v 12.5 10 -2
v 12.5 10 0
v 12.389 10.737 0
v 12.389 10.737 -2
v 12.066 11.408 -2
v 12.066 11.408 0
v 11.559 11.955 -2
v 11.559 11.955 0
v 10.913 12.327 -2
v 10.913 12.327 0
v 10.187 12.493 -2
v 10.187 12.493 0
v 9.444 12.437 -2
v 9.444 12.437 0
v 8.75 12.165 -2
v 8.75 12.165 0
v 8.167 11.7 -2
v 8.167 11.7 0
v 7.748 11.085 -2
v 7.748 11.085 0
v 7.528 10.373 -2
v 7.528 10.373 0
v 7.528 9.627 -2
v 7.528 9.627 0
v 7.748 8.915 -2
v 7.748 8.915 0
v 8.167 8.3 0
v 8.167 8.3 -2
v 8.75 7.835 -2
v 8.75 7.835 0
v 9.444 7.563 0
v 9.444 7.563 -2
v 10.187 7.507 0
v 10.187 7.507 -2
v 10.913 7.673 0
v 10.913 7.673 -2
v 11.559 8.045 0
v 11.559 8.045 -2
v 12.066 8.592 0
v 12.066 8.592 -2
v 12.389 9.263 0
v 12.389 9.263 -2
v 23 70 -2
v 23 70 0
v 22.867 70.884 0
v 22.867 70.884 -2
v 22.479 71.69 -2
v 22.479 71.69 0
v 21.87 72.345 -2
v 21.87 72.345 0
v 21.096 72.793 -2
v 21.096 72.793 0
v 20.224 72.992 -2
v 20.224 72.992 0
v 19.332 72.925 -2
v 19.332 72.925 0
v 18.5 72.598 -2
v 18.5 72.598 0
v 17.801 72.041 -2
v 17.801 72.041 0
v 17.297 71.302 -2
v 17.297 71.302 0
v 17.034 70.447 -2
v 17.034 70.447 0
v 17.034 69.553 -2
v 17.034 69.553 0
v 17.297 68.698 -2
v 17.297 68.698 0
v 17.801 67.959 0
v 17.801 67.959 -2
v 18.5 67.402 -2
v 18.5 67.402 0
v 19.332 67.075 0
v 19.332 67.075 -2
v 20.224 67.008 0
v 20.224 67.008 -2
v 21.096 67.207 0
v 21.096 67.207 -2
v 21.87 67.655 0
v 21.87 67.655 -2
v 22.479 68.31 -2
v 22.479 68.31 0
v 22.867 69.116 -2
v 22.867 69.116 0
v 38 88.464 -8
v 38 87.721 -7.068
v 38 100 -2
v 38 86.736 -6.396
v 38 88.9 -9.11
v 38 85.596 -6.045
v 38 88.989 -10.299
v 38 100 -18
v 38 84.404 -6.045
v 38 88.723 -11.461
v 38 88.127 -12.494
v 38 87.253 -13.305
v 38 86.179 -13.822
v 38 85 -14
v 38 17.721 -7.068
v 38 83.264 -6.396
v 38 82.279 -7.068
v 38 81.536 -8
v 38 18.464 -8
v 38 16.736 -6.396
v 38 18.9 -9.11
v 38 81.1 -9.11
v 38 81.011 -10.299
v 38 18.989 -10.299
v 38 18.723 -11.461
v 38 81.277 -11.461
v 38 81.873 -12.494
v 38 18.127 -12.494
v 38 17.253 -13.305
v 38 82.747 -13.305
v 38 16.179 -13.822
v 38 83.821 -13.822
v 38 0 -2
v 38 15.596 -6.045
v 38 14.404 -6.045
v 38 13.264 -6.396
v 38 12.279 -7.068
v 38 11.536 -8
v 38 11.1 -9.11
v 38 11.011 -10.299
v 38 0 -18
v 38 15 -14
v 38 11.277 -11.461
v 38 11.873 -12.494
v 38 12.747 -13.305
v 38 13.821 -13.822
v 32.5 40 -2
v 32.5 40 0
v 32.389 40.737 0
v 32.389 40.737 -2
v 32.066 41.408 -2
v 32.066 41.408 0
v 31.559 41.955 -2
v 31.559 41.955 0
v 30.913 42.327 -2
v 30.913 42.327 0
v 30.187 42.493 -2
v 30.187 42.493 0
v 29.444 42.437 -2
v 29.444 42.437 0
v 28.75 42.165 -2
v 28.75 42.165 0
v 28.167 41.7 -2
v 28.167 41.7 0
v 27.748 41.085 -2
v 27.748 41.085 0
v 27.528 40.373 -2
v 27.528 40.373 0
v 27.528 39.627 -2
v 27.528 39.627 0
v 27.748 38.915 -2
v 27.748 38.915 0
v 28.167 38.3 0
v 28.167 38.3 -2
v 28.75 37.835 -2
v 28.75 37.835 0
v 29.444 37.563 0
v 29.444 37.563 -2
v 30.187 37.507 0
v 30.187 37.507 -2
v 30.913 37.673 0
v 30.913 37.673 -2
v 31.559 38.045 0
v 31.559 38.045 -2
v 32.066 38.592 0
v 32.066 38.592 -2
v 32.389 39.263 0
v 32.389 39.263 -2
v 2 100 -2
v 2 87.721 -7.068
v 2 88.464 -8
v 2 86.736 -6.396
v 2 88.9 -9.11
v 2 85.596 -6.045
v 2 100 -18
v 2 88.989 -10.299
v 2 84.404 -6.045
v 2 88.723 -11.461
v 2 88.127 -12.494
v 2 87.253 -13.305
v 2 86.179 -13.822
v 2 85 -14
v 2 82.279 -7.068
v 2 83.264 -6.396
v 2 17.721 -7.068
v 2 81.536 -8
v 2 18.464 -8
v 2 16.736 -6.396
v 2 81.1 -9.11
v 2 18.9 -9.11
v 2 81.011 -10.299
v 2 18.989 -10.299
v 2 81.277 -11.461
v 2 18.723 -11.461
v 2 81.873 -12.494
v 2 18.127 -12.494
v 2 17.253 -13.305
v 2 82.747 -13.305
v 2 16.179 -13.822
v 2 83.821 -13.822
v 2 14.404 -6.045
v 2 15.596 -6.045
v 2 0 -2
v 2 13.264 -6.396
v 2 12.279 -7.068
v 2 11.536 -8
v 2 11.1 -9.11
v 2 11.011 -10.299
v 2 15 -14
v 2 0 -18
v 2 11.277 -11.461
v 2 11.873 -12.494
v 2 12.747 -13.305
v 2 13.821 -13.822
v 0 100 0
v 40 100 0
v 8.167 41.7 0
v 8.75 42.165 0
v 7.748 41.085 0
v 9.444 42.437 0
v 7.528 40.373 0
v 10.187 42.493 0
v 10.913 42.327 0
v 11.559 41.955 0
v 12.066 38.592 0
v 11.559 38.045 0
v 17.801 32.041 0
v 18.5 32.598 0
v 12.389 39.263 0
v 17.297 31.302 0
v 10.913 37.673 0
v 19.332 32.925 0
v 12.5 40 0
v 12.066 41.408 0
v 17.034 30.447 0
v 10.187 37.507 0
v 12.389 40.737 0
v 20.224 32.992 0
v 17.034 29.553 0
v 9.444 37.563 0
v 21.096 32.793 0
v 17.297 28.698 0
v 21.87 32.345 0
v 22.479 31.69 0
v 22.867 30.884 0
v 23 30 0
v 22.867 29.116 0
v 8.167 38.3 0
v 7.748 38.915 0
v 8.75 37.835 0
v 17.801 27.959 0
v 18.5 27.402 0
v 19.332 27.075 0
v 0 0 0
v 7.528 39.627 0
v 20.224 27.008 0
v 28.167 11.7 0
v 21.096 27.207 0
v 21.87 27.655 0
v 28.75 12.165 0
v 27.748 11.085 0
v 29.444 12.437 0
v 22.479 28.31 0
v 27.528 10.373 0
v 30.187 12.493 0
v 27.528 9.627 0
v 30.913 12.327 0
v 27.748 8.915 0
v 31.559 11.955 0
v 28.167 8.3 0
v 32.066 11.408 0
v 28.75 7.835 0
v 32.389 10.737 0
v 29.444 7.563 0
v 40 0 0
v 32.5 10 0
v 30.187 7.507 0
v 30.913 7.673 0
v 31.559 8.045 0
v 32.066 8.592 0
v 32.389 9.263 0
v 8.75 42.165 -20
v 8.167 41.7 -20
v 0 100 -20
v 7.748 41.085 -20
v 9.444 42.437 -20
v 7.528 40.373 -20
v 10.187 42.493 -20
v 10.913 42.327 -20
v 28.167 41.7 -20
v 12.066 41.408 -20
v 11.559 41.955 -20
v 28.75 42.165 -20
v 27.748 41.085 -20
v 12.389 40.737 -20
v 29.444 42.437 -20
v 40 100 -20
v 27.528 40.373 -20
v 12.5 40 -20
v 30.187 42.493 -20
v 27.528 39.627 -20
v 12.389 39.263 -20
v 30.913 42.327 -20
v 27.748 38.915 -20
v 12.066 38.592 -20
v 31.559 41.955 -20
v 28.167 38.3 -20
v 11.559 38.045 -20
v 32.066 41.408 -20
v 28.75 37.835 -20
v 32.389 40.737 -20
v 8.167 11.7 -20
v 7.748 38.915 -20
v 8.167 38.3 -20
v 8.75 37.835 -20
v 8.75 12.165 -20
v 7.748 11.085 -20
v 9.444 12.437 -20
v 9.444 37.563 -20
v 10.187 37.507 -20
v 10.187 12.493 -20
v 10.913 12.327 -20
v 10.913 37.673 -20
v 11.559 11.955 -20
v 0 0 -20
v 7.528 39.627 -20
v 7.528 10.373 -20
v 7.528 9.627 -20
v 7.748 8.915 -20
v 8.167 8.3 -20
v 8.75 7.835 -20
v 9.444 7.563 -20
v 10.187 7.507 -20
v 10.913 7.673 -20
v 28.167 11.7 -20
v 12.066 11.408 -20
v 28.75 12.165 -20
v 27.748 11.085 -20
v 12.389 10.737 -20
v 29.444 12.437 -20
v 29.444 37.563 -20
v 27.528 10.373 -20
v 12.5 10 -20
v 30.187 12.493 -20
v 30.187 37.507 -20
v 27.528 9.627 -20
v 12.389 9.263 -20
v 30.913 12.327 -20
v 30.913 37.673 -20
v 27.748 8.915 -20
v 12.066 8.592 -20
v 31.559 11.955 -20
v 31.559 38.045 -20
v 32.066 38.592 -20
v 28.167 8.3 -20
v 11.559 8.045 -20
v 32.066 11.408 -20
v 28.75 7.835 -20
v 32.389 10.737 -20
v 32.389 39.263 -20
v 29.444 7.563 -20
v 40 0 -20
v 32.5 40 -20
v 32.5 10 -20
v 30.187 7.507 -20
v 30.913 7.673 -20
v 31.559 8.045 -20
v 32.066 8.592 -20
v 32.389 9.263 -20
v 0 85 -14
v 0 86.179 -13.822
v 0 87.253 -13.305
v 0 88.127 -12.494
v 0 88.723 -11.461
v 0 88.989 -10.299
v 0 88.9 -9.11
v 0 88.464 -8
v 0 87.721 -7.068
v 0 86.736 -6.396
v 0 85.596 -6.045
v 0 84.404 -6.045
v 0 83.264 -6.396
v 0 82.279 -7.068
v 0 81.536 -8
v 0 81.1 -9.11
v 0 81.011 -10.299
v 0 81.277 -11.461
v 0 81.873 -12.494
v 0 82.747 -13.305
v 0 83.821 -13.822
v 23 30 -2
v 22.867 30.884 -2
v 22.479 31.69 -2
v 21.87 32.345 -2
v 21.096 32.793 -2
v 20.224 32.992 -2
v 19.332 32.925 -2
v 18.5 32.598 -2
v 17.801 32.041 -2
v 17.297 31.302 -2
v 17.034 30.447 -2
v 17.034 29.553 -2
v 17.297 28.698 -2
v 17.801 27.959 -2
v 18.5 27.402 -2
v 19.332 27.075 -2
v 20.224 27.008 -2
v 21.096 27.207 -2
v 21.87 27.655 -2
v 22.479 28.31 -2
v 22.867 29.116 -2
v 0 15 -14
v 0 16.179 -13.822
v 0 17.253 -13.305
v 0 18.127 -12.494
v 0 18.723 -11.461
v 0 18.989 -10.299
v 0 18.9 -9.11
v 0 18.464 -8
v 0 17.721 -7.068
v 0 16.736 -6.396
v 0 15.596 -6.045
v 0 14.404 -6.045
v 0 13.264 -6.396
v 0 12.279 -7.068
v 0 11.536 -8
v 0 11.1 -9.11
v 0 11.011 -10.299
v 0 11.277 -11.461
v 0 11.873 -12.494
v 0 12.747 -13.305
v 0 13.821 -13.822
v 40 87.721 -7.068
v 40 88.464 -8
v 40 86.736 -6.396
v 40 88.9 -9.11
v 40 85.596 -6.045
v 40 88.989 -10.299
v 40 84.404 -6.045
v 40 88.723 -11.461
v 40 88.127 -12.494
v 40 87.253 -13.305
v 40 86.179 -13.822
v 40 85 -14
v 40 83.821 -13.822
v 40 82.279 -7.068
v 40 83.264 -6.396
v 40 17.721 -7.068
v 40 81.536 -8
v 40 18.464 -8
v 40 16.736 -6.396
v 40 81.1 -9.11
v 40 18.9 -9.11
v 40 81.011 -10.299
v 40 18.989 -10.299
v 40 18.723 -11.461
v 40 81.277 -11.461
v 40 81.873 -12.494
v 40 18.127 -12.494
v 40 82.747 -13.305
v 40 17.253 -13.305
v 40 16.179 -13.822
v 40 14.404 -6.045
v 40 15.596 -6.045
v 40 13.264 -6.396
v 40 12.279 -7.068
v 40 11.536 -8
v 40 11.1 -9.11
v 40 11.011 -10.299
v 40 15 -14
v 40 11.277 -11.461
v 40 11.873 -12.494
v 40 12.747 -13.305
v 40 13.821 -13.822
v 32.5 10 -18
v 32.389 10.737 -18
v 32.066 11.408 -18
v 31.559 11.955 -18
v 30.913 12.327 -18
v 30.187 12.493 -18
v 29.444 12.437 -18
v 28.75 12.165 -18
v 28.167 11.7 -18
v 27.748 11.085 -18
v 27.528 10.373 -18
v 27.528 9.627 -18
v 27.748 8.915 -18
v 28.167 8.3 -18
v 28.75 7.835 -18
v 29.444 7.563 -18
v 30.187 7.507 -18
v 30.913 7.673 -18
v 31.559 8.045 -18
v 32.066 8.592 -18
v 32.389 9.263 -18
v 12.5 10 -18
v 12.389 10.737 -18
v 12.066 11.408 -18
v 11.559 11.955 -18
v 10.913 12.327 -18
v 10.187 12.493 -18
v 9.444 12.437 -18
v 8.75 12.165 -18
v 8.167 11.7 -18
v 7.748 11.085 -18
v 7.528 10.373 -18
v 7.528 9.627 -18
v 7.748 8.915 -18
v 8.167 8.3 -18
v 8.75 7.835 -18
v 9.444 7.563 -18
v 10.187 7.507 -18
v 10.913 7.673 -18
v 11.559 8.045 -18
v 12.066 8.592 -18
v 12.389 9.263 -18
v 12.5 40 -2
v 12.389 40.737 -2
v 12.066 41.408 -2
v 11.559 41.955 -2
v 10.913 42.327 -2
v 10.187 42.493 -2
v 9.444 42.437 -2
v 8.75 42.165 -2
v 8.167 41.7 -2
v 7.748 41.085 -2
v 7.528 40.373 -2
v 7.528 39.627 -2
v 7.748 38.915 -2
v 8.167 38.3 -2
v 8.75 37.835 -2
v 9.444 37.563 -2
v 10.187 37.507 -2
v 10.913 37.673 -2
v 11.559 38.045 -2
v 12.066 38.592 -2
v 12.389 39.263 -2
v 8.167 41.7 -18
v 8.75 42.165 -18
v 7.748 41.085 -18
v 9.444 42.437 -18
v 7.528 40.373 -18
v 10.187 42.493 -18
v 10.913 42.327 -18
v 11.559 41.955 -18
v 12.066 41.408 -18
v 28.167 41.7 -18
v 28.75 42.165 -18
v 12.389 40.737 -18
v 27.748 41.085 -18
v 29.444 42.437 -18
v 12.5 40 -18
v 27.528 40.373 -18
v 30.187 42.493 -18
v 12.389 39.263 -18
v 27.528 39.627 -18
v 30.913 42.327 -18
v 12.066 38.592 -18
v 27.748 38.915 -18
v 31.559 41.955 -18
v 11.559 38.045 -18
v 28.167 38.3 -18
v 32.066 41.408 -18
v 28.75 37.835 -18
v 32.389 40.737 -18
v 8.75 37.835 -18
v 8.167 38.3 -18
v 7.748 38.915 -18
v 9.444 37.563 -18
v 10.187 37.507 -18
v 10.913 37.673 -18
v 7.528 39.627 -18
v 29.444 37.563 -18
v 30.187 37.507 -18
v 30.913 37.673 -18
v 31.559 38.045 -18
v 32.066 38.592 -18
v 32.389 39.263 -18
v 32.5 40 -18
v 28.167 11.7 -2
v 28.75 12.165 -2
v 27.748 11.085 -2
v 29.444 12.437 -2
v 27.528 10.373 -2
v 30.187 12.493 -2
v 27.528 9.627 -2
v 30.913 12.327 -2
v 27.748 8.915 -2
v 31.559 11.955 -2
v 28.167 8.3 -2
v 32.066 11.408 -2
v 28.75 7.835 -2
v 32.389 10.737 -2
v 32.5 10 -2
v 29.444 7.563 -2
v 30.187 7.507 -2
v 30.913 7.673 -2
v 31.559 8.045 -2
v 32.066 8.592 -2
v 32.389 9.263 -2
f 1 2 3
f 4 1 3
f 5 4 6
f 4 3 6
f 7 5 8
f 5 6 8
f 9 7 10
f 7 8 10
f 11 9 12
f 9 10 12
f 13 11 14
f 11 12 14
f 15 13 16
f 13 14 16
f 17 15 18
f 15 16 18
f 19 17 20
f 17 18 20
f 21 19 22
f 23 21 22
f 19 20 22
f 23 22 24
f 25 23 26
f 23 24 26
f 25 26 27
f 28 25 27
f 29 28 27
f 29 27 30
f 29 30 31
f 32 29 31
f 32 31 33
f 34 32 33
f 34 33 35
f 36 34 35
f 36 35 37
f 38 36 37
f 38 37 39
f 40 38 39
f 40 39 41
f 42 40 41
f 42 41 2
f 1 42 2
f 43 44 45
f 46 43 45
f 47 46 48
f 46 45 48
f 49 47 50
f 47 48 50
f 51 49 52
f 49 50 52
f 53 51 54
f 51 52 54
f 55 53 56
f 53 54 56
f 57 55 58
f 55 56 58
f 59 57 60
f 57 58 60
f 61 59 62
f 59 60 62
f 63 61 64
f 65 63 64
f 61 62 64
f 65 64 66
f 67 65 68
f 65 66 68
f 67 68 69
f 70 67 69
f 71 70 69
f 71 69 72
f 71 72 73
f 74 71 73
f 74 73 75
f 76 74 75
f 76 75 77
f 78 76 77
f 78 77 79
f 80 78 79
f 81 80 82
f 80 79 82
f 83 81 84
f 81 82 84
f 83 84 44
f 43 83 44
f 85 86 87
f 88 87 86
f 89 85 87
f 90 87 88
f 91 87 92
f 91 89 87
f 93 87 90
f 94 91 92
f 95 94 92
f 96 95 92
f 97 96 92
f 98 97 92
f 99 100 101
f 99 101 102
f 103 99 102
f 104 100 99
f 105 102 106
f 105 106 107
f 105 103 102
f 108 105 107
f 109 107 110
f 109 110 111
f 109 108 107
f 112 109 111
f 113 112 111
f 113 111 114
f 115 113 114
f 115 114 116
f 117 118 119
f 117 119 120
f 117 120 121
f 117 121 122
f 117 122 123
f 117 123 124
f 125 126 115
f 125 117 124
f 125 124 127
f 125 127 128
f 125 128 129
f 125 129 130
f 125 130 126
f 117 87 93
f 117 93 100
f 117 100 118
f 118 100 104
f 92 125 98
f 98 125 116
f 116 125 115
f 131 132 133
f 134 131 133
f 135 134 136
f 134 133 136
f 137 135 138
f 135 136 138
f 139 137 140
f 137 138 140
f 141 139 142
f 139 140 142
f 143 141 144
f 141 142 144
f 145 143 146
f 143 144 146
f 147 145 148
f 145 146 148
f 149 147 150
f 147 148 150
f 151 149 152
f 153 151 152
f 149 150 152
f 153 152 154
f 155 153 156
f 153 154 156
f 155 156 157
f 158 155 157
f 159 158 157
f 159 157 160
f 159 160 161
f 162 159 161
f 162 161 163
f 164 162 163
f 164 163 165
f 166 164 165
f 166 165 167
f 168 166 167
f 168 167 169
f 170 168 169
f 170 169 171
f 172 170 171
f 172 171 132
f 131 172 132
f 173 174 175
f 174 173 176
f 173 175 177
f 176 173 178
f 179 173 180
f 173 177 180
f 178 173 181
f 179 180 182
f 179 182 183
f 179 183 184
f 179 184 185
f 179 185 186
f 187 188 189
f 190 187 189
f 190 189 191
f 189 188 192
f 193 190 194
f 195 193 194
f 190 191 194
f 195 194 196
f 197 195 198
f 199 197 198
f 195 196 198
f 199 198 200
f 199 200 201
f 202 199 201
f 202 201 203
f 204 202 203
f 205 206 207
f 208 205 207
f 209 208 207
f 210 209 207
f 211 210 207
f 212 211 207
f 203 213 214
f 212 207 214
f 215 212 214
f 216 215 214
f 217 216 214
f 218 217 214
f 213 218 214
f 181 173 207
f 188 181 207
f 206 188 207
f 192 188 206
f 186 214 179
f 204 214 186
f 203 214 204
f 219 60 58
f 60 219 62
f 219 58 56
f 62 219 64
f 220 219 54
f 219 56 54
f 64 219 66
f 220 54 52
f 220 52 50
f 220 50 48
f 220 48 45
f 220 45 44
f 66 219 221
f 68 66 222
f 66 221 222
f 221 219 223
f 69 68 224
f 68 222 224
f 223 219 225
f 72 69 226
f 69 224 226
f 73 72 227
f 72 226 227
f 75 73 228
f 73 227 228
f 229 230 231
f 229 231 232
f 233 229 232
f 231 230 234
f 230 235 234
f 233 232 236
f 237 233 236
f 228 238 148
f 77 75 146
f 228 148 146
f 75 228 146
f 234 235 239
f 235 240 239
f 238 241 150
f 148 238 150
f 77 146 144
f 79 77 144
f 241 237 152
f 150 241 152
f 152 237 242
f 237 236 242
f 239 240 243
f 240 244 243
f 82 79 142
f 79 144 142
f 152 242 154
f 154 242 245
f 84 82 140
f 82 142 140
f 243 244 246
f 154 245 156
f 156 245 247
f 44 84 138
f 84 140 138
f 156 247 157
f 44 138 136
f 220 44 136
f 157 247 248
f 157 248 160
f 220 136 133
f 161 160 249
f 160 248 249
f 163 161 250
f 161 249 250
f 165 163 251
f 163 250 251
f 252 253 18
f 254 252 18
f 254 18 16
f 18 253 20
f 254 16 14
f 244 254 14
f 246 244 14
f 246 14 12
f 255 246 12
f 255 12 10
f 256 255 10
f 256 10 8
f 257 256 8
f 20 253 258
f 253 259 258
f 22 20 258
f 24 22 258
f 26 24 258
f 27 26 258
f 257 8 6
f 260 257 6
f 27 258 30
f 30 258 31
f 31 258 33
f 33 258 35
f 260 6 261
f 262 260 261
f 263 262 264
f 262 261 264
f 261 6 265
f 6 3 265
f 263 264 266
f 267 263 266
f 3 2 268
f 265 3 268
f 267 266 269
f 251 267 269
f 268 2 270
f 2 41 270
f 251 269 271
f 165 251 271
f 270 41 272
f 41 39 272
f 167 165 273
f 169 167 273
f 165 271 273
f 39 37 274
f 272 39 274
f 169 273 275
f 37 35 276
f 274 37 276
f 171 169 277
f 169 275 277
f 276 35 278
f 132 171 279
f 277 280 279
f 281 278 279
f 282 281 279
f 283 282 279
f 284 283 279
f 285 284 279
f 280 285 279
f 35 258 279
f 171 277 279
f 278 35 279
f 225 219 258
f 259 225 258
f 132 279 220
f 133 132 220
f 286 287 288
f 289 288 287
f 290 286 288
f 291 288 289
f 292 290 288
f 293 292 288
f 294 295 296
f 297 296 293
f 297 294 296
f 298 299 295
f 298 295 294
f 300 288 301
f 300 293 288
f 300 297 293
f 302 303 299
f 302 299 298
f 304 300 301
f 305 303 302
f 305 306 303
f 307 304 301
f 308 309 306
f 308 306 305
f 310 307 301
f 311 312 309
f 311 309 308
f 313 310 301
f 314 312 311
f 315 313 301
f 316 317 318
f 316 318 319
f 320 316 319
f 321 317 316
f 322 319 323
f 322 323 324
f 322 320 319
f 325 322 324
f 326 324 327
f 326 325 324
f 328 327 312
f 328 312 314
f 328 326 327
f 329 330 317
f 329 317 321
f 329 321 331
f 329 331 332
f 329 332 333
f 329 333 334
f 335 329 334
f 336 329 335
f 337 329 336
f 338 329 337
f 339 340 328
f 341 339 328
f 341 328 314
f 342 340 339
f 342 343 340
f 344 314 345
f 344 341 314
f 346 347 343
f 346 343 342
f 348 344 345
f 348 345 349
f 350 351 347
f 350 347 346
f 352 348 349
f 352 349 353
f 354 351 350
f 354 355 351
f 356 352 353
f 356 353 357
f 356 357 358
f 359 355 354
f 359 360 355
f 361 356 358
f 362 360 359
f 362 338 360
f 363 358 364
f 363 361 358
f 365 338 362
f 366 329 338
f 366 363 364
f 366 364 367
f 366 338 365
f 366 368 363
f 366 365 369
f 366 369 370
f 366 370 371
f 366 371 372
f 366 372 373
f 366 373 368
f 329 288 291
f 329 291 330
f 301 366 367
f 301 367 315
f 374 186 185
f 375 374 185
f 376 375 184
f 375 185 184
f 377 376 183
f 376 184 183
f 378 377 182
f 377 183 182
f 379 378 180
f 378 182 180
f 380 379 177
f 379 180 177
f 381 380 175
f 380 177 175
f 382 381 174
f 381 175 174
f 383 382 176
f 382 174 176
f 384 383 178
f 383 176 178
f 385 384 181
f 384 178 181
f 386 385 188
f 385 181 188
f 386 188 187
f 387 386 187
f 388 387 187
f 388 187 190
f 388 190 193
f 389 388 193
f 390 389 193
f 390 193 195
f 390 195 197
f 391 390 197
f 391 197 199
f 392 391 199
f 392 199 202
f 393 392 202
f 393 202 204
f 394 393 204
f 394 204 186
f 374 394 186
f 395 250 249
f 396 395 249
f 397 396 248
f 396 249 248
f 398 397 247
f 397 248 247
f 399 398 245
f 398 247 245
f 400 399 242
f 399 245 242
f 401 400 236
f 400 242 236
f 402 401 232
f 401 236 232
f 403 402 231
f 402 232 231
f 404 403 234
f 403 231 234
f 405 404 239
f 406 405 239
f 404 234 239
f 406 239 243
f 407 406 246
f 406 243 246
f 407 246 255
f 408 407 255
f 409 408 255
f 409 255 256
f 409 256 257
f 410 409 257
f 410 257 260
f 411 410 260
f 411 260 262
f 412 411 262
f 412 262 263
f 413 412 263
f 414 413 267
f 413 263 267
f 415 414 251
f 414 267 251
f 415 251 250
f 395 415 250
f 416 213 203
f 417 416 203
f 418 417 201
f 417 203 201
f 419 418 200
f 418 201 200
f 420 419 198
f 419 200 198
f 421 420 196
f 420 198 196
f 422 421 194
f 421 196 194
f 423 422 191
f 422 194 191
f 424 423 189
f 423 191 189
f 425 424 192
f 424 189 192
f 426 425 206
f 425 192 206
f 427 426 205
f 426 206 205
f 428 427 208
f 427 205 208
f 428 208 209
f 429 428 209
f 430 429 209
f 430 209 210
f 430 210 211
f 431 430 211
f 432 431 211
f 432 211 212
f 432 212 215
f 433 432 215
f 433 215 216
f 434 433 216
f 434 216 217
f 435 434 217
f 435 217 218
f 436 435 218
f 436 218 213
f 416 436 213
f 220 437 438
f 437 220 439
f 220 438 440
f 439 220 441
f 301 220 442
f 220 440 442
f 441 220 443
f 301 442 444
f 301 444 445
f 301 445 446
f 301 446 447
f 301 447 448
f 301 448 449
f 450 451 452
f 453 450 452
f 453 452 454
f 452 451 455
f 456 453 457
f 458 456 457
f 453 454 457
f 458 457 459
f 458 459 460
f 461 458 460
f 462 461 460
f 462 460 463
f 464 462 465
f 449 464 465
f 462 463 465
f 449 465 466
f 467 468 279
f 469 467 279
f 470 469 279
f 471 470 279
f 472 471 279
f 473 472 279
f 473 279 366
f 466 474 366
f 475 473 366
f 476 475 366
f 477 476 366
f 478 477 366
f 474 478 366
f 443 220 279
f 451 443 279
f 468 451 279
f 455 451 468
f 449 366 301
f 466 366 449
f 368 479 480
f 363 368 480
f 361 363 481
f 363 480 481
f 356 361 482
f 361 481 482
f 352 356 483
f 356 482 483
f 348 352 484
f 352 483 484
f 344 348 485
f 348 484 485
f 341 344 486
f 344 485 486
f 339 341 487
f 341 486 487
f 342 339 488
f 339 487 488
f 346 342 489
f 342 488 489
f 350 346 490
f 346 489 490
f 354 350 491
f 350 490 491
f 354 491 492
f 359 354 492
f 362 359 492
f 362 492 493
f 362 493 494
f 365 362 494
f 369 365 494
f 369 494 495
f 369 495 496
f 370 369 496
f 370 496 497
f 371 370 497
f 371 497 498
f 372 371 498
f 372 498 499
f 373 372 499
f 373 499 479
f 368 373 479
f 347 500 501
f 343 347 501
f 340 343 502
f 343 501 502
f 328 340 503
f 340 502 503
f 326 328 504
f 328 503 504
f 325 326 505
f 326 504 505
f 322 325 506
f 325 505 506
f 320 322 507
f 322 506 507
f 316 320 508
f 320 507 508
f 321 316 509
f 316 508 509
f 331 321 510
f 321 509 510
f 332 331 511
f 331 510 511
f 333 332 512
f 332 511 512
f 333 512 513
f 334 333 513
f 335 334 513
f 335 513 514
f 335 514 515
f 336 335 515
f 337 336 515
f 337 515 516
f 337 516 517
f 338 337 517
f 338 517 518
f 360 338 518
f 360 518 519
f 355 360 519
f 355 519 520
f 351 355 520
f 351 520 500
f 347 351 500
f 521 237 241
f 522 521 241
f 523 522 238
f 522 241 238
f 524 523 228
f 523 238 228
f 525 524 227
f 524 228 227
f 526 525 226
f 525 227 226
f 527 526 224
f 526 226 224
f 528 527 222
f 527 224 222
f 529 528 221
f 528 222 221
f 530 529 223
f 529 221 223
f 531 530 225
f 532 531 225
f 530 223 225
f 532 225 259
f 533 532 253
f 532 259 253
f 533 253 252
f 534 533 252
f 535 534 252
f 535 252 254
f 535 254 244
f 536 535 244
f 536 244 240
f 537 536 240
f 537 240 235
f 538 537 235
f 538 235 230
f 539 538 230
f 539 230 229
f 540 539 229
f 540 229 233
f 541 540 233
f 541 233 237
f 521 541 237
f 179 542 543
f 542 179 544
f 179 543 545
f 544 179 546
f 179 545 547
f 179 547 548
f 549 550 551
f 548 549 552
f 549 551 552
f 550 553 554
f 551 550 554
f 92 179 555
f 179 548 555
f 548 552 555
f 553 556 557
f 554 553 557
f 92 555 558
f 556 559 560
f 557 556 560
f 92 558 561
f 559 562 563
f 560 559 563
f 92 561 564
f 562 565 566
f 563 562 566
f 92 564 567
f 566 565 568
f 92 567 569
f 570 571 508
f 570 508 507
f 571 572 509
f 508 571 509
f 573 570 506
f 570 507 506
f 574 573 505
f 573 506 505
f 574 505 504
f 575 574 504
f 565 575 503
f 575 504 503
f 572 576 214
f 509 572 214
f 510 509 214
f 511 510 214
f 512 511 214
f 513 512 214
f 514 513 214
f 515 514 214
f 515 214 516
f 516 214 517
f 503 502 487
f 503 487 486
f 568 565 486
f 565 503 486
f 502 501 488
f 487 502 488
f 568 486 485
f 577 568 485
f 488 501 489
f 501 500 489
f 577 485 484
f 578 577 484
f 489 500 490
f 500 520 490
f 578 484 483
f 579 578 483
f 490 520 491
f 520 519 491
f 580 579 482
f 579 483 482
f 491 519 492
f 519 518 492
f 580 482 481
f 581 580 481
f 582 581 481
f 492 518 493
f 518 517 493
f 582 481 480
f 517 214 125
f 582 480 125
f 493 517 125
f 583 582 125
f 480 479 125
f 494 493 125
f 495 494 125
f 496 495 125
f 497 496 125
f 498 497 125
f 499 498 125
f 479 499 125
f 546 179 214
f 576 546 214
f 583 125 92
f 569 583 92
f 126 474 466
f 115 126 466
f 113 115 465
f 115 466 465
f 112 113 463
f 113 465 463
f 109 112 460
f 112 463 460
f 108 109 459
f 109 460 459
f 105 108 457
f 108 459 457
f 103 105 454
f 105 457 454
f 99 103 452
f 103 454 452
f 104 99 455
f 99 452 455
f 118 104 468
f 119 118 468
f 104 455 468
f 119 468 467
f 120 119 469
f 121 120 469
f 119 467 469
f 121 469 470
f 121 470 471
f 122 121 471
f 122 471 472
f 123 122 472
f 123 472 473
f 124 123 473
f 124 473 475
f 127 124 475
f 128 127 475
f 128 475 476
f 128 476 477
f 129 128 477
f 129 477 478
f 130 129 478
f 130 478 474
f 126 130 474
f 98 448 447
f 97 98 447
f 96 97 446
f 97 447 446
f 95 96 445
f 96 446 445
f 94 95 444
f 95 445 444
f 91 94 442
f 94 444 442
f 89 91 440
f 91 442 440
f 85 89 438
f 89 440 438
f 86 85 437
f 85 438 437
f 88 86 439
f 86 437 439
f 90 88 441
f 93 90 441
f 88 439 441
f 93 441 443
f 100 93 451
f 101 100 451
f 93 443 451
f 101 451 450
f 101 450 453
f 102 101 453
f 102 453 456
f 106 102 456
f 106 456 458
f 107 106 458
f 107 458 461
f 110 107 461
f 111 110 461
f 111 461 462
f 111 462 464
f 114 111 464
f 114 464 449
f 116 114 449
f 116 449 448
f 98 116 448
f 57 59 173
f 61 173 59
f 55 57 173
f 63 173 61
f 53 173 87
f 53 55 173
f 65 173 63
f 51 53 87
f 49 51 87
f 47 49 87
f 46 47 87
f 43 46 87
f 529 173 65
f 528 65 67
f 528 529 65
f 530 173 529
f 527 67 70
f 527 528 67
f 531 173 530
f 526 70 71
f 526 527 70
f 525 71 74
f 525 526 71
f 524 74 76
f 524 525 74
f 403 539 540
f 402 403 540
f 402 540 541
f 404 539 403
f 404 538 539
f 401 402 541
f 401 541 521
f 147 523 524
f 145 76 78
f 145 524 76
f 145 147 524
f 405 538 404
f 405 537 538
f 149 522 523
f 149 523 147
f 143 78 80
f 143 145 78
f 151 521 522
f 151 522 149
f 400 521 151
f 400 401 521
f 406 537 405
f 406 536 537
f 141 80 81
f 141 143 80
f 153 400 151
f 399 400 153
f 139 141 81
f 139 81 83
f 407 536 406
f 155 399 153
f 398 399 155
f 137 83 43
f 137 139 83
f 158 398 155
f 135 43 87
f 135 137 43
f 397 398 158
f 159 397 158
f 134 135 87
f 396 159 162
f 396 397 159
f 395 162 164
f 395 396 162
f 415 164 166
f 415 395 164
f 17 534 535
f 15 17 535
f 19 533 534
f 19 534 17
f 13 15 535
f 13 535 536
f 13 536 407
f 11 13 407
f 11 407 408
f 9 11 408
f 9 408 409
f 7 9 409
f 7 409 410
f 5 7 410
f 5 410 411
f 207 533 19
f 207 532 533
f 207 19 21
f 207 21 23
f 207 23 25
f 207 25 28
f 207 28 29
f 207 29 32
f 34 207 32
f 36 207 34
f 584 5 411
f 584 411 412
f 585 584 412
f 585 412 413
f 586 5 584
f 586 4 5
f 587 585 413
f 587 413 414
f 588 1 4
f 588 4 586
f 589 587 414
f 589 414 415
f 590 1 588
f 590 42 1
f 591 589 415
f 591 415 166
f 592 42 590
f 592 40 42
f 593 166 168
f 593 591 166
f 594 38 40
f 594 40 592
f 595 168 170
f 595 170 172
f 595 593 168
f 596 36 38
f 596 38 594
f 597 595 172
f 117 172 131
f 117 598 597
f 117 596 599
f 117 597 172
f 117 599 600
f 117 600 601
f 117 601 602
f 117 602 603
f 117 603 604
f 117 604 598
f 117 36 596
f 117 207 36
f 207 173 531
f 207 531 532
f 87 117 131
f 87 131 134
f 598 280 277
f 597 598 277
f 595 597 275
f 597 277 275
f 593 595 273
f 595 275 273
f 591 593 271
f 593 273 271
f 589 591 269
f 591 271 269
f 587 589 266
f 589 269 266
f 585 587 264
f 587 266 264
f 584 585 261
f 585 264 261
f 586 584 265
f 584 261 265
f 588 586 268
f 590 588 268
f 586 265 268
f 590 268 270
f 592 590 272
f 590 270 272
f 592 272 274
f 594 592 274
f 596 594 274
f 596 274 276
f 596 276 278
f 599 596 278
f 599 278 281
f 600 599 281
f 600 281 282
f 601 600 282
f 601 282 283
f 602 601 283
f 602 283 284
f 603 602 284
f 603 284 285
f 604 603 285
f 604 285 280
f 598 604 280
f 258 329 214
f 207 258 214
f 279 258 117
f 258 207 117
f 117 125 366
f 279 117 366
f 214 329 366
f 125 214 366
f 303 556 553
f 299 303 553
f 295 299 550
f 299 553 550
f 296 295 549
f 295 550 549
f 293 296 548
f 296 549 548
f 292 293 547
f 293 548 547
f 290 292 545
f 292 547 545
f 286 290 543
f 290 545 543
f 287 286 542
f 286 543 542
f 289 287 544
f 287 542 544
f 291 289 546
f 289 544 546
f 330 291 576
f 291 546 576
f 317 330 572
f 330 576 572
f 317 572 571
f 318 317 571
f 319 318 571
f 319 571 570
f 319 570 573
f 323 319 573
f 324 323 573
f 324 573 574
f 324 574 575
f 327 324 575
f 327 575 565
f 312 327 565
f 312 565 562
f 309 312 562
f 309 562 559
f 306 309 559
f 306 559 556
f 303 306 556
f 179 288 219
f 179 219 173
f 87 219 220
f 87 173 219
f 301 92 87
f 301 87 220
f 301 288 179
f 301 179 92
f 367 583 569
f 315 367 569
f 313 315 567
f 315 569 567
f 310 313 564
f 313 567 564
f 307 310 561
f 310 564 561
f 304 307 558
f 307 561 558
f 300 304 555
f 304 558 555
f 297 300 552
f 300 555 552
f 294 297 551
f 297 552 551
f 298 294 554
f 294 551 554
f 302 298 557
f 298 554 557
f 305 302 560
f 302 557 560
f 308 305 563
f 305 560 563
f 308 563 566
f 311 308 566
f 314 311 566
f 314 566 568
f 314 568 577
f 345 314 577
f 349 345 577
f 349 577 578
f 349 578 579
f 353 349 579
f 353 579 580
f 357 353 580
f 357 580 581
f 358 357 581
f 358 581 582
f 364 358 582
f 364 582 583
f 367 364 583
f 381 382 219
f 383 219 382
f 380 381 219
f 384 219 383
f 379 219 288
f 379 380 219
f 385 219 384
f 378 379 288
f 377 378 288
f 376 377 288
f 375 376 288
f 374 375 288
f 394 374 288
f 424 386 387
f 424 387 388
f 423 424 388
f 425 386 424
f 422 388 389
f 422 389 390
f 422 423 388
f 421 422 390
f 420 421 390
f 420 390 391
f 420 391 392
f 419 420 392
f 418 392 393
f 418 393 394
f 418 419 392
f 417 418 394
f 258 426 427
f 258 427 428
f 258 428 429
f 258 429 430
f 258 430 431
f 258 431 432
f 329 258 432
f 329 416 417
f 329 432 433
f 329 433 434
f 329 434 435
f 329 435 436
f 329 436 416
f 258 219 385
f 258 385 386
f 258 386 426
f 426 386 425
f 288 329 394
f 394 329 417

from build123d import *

# Parameters (mm, degrees)
SKICA1_W                 = 40
SKICA1_H                 = 20
SKICA1_W_2               = 36
SKICA1_H_2               = 16
P_IDAT_VYSUNUT_M1_DEPTH  = 100
SKICA2_R                 = 4
ODEBRAT_VYSUNUT_M1_DEPTH = 40
SKETCH1_R                = 2.5
CUT_EXTRUDE1_DEPTH       = 20
SKETCH2_R                = 3
CUT_EXTRUDE2_DEPTH       = 2


with BuildPart() as part:
    # Skica1 → Přidat vysunutím1 (new body)
    with BuildSketch(Plane(origin=(0, 0, 0), x_dir=(1, 0, 0), z_dir=(0, 1, 0))):
        with Locations((20, 10)):
            Rectangle(SKICA1_W, SKICA1_H)
        with Locations((20, 10)):
            Rectangle(SKICA1_W_2, SKICA1_H_2, mode=Mode.SUBTRACT)
    extrude(amount=P_IDAT_VYSUNUT_M1_DEPTH)

    # Skica2 → Odebrat vysunutím1 (cut)
    with BuildSketch(Plane(origin=(40, 0, 0), x_dir=(0, 0, -1), z_dir=(1, 0, 0))):
        with Locations((10, 85)):
            Circle(SKICA2_R)
        with Locations((10, 15)):
            Circle(SKICA2_R)
    extrude(amount=-ODEBRAT_VYSUNUT_M1_DEPTH, mode=Mode.SUBTRACT)

    # Sketch1 → Cut-Extrude1 (cut)
    with BuildSketch(Plane.XY):
        with Locations((10, 10)):
            Circle(SKETCH1_R)
        with Locations((30, 10)):
            Circle(SKETCH1_R)
        with Locations((30, 40)):
            Circle(SKETCH1_R)
        with Locations((10, 40)):
            Circle(SKETCH1_R)
    extrude(amount=-CUT_EXTRUDE1_DEPTH, mode=Mode.SUBTRACT)

    # Sketch2 → Cut-Extrude2 (cut)
    with BuildSketch(Plane.XY):
        with Locations((20, 30)):
            Circle(SKETCH2_R)
        with Locations((20, 70)):
            Circle(SKETCH2_R)
    extrude(amount=-CUT_EXTRUDE2_DEPTH, mode=Mode.SUBTRACT)


solid = part.part
